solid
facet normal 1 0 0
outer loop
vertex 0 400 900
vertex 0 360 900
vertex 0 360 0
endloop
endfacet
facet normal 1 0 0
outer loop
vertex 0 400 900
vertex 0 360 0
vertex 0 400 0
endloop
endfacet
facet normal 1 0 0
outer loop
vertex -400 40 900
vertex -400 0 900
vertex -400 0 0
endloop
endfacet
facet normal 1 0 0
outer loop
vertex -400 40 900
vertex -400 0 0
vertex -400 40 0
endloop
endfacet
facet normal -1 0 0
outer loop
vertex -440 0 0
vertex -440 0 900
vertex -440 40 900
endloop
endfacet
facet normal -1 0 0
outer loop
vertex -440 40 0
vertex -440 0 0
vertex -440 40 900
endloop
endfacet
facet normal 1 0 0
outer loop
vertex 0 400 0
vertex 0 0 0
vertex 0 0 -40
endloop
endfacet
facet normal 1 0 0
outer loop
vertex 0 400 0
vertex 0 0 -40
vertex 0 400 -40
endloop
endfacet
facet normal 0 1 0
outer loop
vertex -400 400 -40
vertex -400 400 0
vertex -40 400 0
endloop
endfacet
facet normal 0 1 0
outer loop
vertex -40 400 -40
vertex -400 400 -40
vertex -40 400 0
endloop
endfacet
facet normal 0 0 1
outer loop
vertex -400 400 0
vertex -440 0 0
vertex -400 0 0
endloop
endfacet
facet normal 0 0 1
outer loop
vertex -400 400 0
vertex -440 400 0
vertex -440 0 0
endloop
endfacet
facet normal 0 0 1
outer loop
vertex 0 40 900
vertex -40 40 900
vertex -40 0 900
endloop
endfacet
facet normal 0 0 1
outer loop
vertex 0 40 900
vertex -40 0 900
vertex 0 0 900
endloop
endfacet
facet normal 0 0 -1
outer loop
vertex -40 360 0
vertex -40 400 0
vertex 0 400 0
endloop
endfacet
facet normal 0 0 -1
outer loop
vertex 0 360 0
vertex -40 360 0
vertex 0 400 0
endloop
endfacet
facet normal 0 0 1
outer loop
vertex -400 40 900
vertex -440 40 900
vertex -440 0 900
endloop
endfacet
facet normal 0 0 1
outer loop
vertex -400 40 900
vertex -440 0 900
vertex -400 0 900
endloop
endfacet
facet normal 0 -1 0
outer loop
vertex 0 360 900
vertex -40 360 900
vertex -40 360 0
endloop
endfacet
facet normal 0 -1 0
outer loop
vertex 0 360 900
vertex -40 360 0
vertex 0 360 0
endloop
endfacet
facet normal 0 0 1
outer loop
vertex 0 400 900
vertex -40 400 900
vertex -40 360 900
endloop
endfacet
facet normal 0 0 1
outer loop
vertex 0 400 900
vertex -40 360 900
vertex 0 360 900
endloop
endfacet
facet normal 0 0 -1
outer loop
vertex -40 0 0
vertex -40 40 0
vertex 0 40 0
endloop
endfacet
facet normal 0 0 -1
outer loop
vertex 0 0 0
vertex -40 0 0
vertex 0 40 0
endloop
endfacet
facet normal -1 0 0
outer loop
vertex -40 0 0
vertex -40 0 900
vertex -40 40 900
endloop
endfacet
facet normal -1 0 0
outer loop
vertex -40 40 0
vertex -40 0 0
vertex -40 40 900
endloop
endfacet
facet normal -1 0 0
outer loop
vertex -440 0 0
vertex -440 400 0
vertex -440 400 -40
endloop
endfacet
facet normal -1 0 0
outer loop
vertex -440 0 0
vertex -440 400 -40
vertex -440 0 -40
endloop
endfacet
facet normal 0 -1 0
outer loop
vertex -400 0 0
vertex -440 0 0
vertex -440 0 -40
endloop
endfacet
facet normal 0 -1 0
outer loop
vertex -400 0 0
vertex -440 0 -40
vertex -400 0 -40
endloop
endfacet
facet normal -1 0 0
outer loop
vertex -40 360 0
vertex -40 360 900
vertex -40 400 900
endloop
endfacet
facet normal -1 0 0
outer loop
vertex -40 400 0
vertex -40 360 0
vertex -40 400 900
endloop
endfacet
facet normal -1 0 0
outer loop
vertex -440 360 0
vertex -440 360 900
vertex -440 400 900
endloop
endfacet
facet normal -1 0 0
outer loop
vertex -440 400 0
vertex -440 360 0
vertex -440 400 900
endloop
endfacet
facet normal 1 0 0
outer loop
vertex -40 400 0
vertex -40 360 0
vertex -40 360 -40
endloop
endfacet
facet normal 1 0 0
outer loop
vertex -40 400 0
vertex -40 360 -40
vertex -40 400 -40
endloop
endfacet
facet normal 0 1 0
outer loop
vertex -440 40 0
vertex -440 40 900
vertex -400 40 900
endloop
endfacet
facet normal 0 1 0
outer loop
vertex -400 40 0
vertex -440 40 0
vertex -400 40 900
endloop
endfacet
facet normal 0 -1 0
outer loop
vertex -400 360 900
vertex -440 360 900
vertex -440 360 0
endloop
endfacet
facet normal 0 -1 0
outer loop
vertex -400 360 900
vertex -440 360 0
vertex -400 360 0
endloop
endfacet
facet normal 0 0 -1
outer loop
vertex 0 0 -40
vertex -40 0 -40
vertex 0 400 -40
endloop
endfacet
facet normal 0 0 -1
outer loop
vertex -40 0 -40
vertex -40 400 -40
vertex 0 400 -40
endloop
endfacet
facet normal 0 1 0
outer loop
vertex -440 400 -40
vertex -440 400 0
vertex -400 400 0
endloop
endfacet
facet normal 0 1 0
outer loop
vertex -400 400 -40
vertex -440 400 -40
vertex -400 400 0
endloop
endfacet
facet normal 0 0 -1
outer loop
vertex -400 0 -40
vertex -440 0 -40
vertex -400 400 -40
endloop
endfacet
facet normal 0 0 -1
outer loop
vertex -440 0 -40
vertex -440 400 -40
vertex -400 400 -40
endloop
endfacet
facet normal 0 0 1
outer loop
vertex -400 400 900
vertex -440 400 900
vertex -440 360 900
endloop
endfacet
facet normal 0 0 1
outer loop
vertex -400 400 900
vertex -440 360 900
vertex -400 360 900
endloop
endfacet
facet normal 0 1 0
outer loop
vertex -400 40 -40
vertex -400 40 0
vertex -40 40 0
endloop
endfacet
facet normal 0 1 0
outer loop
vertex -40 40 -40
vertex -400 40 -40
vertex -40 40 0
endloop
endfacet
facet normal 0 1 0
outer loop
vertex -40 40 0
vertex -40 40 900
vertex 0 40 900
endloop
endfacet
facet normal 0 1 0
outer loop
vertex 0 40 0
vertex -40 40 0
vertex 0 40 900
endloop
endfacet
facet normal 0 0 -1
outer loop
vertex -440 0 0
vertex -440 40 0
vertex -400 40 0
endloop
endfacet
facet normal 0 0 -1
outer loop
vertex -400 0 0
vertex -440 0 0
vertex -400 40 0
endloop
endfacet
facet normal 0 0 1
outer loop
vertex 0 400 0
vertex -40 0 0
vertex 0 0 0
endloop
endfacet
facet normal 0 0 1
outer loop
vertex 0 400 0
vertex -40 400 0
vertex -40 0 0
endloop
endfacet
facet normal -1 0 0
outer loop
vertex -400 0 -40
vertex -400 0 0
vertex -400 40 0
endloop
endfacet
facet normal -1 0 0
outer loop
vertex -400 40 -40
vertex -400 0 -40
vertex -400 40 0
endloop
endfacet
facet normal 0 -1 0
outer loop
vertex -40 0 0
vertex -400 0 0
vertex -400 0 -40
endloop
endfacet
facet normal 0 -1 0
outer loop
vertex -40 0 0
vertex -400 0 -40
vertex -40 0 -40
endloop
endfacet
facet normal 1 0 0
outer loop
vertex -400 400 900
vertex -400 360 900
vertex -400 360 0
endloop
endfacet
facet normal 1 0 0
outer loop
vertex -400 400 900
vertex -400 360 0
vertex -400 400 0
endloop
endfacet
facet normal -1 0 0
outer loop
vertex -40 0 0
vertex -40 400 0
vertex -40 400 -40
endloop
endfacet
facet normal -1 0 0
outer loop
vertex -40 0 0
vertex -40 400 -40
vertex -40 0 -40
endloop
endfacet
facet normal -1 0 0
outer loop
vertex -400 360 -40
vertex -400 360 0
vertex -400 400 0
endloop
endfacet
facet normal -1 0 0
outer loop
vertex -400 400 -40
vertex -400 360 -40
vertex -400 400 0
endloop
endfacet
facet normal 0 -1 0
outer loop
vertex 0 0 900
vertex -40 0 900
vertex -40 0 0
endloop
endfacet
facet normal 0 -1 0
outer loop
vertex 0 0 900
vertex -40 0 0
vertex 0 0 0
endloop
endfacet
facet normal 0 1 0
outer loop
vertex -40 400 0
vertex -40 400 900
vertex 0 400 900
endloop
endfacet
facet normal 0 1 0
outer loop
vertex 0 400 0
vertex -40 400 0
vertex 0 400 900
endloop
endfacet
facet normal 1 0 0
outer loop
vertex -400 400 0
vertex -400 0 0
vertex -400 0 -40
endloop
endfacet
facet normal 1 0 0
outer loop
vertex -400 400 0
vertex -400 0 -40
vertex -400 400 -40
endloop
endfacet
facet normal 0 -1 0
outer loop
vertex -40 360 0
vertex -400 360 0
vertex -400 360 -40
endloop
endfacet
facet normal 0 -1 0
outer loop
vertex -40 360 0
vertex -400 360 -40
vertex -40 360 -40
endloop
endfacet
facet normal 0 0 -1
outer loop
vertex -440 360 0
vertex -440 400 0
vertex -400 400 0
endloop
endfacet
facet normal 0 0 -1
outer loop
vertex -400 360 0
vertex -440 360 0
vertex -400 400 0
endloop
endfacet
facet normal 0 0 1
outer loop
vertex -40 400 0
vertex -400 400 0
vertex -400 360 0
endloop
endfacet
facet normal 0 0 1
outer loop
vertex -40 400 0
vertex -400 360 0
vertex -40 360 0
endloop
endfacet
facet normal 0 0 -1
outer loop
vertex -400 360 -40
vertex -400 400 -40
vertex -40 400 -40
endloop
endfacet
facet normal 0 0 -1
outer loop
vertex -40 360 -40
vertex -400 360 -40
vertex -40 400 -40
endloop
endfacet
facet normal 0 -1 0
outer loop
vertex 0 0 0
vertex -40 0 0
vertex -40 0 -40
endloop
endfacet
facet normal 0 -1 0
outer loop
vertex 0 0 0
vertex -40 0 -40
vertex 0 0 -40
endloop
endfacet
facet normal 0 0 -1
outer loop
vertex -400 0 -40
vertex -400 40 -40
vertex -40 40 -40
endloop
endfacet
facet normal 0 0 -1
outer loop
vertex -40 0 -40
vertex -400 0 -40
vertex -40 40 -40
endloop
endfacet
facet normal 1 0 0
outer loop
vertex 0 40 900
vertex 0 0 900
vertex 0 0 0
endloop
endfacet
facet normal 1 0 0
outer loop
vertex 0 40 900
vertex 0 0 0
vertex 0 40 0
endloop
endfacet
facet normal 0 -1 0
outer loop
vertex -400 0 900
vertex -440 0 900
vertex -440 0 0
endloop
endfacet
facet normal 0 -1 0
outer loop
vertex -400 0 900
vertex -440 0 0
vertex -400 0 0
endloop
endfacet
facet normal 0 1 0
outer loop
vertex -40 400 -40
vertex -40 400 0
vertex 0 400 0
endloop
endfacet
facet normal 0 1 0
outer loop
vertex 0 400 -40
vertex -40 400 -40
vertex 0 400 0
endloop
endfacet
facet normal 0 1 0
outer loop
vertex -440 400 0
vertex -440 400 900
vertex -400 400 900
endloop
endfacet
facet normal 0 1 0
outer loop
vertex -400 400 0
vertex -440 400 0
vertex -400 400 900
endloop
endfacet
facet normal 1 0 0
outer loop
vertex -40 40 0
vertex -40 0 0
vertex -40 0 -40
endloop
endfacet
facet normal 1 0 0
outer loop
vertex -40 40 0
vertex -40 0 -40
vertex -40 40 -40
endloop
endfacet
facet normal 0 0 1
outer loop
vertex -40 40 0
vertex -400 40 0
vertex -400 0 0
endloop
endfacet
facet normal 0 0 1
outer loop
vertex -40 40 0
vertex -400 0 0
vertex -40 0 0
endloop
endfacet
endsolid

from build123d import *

# Parameters (mm, degrees)
F0_W     = 40
F0_H     = 40
F1_DEPTH = 900
F0_H_2   = 320
F2_DEPTH = 40
F0_W_2   = 360
F3_DEPTH = 40


with BuildPart() as f1:
    # F0 (on Top) → F1 (new body)
    with BuildSketch(Plane.XY):
        with Locations((-20, 20)):
            Rectangle(F0_W, F0_H)
        with Locations((-20, 380)):
            Rectangle(F0_W, F0_H)
        with Locations((-420, 20)):
            Rectangle(F0_W, F0_H)
        with Locations((-420, 380)):
            Rectangle(F0_W, F0_H)
    extrude(amount=F1_DEPTH)


with BuildPart() as f2:
    # F0 (on Top) → F2 (new body)
    with BuildSketch(Plane.XY):
        with Locations((-420, 20)):
            Rectangle(F0_W, F0_H)
        with Locations((-420, 200)):
            Rectangle(F0_W, F0_H_2)
        with Locations((-420, 380)):
            Rectangle(F0_W, F0_H)
        with Locations((-20, 20)):
            Rectangle(F0_W, F0_H)
        with Locations((-20, 200)):
            Rectangle(F0_W, F0_H_2)
        with Locations((-20, 380)):
            Rectangle(F0_W, F0_H)
    extrude(amount=-F2_DEPTH)


with BuildPart() as f3:
    # F0 (on Top) → F3 (new body)
    with BuildSketch(Plane.XY):
        with Locations((-220, 20)):
            Rectangle(F0_W_2, F0_H)
        with Locations((-220, 380)):
            Rectangle(F0_W_2, F0_H)
    extrude(amount=-F3_DEPTH)


solid = Compound([f1.part, f2.part, f3.part])
